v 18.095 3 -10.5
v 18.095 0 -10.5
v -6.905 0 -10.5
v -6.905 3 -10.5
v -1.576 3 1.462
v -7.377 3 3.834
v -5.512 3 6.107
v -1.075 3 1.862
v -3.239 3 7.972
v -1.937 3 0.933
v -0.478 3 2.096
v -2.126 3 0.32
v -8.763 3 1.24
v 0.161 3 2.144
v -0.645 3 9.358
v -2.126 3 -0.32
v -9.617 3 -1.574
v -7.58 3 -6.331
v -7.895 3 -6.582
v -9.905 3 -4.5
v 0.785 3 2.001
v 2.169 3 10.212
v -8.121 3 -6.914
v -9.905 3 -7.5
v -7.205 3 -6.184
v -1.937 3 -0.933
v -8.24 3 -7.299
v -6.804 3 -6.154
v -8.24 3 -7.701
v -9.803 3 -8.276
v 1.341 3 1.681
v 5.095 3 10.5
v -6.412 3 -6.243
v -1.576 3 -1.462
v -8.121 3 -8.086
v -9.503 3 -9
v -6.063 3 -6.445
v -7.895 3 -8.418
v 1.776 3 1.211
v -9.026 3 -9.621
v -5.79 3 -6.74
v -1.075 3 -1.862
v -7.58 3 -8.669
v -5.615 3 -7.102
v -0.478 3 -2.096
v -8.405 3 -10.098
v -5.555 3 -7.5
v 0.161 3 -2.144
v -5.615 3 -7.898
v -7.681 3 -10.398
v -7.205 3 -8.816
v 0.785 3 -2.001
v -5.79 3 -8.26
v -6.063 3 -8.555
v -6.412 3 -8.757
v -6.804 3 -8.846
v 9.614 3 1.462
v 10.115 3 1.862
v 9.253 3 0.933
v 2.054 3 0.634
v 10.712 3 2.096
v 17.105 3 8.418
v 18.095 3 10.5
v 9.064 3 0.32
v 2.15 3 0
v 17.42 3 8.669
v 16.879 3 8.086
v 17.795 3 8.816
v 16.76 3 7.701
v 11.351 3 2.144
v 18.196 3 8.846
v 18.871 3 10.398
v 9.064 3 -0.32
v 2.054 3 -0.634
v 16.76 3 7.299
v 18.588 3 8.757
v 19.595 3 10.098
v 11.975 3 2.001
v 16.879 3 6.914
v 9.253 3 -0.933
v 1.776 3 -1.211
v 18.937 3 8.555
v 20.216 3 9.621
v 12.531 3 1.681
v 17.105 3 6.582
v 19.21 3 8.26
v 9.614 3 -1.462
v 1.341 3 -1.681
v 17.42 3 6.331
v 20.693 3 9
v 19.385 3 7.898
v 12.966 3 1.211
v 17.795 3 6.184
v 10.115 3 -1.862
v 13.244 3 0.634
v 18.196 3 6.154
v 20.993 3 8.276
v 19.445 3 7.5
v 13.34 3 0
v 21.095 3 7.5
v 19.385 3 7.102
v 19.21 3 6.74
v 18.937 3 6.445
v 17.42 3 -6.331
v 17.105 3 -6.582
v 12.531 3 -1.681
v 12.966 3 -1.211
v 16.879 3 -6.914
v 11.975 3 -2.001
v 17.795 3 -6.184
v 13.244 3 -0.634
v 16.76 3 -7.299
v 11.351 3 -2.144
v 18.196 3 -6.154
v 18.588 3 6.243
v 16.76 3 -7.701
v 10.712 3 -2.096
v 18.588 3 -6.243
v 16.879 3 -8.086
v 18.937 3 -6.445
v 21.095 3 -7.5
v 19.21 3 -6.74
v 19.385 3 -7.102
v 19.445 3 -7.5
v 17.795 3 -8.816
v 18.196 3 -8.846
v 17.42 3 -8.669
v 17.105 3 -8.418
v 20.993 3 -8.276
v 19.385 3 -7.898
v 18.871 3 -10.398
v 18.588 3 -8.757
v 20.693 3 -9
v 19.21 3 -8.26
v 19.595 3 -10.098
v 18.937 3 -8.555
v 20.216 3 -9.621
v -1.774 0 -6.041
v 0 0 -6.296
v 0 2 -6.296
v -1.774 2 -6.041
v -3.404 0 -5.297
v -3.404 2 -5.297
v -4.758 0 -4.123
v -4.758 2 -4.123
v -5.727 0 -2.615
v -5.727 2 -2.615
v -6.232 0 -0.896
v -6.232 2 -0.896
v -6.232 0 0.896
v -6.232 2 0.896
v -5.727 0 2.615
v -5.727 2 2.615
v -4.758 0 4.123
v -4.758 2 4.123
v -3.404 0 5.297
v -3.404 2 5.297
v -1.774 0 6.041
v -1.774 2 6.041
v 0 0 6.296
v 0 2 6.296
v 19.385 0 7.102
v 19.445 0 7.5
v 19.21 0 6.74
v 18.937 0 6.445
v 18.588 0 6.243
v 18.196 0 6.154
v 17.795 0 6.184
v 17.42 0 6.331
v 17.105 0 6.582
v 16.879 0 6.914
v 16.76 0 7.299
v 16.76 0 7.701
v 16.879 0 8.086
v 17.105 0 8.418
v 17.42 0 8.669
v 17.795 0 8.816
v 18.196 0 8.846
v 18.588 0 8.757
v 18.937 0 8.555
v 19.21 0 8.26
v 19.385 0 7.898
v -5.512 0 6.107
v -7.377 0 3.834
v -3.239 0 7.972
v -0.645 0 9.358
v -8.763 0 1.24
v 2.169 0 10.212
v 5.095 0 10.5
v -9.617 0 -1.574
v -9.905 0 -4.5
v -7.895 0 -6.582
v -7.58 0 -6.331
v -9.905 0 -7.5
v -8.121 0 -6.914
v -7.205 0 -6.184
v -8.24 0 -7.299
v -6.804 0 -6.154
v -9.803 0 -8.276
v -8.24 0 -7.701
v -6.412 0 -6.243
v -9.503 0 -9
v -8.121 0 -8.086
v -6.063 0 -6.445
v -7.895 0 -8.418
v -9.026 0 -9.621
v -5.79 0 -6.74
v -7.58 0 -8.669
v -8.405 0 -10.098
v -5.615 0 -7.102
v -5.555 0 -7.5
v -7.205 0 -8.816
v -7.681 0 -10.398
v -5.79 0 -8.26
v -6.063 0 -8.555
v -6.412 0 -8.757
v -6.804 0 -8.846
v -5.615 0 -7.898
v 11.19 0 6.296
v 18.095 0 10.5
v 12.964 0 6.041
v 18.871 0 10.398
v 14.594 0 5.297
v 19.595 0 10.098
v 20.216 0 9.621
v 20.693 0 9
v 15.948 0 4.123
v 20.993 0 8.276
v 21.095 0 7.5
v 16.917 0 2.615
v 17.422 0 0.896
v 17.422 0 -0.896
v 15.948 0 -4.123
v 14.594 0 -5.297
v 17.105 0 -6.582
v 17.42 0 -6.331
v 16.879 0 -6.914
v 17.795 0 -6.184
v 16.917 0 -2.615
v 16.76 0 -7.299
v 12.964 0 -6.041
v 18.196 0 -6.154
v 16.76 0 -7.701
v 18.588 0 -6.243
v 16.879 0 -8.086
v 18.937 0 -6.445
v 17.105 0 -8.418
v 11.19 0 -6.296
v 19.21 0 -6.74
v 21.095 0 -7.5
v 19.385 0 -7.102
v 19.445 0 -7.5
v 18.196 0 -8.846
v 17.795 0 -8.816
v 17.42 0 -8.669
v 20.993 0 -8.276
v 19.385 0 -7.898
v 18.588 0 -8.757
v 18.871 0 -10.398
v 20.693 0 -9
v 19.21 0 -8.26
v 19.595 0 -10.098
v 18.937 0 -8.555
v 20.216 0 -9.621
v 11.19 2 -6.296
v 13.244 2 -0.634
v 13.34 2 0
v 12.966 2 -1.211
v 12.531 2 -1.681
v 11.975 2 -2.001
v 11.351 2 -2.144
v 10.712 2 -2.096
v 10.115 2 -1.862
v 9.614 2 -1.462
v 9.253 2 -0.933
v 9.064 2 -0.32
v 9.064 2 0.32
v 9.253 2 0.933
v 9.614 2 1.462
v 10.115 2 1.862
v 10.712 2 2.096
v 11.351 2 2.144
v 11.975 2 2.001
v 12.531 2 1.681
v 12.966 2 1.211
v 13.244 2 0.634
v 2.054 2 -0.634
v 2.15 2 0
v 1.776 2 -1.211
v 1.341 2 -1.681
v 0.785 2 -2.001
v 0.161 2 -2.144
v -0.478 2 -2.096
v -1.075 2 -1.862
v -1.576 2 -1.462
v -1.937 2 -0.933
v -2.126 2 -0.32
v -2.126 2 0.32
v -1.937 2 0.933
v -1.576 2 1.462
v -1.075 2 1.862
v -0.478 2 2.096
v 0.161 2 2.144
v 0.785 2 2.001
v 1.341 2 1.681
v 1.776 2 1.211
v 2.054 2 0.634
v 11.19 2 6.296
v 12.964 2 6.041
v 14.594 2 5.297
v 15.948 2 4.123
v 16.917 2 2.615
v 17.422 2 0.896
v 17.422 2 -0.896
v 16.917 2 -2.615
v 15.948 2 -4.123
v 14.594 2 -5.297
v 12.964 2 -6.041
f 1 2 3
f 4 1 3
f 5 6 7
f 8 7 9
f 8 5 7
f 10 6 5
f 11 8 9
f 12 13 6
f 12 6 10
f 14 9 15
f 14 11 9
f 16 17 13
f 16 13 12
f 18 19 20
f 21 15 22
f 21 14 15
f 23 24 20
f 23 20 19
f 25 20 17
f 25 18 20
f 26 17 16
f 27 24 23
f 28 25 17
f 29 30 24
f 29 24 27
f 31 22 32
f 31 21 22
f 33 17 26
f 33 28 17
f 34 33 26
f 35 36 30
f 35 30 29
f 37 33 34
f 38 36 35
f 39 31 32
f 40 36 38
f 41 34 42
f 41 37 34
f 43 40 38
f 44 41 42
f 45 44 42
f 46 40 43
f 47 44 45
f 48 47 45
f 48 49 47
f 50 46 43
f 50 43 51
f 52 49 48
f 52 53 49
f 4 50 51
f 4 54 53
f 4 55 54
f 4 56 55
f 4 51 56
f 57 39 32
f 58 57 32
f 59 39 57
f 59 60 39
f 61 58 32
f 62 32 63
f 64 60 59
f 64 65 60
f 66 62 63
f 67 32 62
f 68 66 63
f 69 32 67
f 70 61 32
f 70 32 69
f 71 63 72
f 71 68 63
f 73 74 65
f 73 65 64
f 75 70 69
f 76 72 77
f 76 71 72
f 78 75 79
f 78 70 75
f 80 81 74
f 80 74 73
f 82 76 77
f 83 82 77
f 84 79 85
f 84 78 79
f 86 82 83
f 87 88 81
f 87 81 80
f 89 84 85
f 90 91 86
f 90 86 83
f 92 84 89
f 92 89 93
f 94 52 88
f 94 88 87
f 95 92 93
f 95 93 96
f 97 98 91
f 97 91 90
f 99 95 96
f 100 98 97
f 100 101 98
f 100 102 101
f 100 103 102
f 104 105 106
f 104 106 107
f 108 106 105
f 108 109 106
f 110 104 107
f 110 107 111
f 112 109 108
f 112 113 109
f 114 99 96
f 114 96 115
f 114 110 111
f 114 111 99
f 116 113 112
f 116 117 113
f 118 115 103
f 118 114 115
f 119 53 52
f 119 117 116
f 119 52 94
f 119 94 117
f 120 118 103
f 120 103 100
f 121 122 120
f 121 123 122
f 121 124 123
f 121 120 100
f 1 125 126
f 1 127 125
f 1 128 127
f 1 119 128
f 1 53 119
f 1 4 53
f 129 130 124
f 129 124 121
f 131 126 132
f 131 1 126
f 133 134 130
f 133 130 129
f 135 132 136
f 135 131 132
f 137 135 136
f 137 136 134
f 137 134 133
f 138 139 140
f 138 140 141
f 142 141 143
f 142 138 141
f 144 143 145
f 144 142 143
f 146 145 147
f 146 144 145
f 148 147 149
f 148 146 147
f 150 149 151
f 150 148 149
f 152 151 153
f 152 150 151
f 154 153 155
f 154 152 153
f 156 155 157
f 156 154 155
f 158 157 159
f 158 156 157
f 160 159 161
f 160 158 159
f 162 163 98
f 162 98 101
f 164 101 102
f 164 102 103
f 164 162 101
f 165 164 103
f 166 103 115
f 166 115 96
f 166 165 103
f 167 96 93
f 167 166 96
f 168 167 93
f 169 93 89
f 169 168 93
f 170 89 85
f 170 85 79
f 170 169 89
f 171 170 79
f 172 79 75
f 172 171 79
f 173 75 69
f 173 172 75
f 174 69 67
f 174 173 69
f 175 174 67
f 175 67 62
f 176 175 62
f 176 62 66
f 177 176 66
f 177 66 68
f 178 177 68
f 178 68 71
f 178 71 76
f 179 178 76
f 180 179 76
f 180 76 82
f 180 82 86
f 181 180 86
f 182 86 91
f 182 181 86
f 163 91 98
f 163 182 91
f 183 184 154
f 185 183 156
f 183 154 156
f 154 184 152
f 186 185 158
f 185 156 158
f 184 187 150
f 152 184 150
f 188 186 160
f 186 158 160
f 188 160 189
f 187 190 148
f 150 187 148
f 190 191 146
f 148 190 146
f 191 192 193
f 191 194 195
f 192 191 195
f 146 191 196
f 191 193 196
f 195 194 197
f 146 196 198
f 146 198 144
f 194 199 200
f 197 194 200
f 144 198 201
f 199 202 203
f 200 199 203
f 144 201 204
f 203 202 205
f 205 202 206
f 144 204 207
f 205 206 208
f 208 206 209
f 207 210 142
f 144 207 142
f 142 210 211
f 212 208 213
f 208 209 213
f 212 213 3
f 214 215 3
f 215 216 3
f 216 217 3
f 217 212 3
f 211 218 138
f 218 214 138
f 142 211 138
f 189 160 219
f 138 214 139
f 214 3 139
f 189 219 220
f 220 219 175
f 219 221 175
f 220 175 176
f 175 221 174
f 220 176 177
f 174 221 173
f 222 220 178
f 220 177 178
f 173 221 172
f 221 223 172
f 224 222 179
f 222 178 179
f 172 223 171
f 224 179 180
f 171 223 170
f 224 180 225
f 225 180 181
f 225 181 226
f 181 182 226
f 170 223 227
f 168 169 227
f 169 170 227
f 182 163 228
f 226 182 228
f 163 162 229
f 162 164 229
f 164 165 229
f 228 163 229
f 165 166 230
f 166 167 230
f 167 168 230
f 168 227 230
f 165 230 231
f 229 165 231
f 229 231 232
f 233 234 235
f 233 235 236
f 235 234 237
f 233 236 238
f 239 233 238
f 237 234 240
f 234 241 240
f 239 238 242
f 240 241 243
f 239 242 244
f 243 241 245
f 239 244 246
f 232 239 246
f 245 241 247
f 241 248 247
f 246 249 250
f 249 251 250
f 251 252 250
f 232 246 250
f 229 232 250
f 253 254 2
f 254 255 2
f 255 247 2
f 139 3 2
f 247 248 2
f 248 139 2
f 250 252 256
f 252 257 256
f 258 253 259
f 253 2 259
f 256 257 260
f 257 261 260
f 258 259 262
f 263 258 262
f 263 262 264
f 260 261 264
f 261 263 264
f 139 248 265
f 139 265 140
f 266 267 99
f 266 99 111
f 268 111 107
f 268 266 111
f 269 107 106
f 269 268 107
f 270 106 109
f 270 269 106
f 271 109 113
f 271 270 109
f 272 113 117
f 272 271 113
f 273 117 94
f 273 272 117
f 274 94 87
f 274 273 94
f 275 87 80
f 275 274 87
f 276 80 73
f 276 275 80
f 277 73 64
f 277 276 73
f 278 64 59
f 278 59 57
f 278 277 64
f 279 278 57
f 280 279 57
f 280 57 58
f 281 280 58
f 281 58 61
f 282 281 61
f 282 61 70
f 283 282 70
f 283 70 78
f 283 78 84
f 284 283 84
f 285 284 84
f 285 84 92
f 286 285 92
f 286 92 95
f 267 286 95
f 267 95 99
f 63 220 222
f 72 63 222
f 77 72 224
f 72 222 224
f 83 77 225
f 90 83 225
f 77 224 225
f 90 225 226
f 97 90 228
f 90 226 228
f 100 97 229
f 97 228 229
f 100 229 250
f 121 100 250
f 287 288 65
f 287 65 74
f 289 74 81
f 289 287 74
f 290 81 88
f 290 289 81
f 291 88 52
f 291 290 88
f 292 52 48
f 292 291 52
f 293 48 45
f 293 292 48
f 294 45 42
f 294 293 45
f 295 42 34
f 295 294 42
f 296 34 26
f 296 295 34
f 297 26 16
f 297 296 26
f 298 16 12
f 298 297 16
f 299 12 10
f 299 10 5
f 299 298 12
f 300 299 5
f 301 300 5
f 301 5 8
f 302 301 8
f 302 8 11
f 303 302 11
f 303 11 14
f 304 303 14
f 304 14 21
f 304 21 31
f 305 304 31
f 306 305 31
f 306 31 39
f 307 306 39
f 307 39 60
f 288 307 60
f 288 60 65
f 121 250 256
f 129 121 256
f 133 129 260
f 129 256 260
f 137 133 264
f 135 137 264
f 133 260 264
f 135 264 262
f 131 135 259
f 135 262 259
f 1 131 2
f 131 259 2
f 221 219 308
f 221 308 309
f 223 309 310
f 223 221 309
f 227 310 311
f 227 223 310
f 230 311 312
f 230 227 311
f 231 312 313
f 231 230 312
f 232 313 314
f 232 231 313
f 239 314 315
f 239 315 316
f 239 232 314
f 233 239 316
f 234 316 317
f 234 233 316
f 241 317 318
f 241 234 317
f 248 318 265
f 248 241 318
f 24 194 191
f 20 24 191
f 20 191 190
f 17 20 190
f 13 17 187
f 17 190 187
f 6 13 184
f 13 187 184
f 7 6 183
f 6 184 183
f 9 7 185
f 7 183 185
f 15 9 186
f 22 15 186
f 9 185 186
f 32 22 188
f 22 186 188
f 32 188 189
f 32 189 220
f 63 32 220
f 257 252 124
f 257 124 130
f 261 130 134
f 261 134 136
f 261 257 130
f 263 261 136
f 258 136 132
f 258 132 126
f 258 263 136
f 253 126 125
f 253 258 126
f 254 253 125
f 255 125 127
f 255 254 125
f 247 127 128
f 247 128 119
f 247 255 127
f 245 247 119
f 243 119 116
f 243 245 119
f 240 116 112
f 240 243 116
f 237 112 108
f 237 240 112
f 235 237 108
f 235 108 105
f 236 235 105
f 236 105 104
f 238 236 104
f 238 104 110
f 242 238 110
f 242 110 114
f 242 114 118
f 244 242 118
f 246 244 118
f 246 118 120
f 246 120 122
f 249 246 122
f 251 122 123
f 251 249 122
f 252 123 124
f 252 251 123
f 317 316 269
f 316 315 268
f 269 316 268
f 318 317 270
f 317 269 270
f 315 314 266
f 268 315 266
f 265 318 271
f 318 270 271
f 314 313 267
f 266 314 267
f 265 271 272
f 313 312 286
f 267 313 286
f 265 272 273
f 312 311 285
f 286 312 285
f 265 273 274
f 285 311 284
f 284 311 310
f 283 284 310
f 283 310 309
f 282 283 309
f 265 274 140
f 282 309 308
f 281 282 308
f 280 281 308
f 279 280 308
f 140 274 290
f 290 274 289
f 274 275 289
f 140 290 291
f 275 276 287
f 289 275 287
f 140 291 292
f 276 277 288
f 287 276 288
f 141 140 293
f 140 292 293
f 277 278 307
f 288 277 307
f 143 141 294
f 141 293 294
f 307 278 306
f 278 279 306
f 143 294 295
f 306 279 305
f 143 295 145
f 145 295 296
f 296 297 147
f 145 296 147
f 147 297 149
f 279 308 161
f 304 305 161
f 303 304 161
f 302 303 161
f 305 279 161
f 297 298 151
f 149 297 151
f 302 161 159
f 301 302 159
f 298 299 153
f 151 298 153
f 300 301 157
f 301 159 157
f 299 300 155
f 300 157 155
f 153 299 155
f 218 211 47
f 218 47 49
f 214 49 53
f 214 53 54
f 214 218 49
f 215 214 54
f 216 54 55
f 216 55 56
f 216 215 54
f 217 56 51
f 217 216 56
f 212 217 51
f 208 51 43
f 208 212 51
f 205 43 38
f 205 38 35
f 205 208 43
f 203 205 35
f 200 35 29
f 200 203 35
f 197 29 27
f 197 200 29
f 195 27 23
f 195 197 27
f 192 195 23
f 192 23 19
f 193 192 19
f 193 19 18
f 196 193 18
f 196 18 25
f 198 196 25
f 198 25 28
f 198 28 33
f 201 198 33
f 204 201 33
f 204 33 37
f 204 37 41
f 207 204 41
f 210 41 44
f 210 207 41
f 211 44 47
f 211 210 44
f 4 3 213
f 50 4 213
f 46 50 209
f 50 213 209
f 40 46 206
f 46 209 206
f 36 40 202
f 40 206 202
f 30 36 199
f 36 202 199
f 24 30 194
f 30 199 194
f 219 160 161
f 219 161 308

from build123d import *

# Parameters (mm, degrees)
SKETCH1_R           = 2.15
SKETCH1_R_2         = 1.35
BOSS_EXTRUDE1_DEPTH = 3
CUT_EXTRUDE1_DEPTH  = 2


with BuildPart() as part:
    # Sketch1 → Boss-Extrude1 (new body)
    with BuildSketch(Plane(origin=(0, 0, 0), x_dir=(1, 0, 0), z_dir=(0, 1, 0))):
        with BuildLine():
            Line((5.095, -10.5), (18.095, -10.5))
            ThreePointArc((18.095, -10.5), (20.216320344, -9.621320344), (21.095, -7.5))
            Line((21.095, -7.5), (21.095, 7.5))
            ThreePointArc((21.095, 7.5), (20.216320344, 9.621320344), (18.095, 10.5))
            Line((18.095, 10.5), (-6.905, 10.5))
            ThreePointArc((-6.905, 10.5), (-9.026320344, 9.621320344), (-9.905, 7.5))
            Line((-9.905, 7.5), (-9.905, 4.5))
            ThreePointArc((-9.905, 4.5), (-5.511601718, -6.106601718), (5.095, -10.5))
        make_face()
        Circle(SKETCH1_R, mode=Mode.SUBTRACT)
        with Locations((11.19, 0)):
            Circle(SKETCH1_R, mode=Mode.SUBTRACT)
        with Locations((-6.905, 7.5)):
            Circle(SKETCH1_R_2, mode=Mode.SUBTRACT)
        with Locations((18.095, 7.5)):
            Circle(SKETCH1_R_2, mode=Mode.SUBTRACT)
        with Locations((18.095, -7.5)):
            Circle(SKETCH1_R_2, mode=Mode.SUBTRACT)
    extrude(amount=BOSS_EXTRUDE1_DEPTH)

    # Sketch2 → Cut-Extrude1 (cut)
    with BuildSketch(Plane.XZ):
        with BuildLine():
            Line((0, 6.29609527), (11.19, 6.29609527))
            ThreePointArc((11.19, 6.29609527), (17.48609527, 0), (11.19, -6.29609527))
            Line((11.19, -6.29609527), (0, -6.29609527))
            ThreePointArc((0, -6.29609527), (-6.29609527, 0), (0, 6.29609527))
        make_face()
    extrude(amount=-CUT_EXTRUDE1_DEPTH, mode=Mode.SUBTRACT)


solid = part.part
